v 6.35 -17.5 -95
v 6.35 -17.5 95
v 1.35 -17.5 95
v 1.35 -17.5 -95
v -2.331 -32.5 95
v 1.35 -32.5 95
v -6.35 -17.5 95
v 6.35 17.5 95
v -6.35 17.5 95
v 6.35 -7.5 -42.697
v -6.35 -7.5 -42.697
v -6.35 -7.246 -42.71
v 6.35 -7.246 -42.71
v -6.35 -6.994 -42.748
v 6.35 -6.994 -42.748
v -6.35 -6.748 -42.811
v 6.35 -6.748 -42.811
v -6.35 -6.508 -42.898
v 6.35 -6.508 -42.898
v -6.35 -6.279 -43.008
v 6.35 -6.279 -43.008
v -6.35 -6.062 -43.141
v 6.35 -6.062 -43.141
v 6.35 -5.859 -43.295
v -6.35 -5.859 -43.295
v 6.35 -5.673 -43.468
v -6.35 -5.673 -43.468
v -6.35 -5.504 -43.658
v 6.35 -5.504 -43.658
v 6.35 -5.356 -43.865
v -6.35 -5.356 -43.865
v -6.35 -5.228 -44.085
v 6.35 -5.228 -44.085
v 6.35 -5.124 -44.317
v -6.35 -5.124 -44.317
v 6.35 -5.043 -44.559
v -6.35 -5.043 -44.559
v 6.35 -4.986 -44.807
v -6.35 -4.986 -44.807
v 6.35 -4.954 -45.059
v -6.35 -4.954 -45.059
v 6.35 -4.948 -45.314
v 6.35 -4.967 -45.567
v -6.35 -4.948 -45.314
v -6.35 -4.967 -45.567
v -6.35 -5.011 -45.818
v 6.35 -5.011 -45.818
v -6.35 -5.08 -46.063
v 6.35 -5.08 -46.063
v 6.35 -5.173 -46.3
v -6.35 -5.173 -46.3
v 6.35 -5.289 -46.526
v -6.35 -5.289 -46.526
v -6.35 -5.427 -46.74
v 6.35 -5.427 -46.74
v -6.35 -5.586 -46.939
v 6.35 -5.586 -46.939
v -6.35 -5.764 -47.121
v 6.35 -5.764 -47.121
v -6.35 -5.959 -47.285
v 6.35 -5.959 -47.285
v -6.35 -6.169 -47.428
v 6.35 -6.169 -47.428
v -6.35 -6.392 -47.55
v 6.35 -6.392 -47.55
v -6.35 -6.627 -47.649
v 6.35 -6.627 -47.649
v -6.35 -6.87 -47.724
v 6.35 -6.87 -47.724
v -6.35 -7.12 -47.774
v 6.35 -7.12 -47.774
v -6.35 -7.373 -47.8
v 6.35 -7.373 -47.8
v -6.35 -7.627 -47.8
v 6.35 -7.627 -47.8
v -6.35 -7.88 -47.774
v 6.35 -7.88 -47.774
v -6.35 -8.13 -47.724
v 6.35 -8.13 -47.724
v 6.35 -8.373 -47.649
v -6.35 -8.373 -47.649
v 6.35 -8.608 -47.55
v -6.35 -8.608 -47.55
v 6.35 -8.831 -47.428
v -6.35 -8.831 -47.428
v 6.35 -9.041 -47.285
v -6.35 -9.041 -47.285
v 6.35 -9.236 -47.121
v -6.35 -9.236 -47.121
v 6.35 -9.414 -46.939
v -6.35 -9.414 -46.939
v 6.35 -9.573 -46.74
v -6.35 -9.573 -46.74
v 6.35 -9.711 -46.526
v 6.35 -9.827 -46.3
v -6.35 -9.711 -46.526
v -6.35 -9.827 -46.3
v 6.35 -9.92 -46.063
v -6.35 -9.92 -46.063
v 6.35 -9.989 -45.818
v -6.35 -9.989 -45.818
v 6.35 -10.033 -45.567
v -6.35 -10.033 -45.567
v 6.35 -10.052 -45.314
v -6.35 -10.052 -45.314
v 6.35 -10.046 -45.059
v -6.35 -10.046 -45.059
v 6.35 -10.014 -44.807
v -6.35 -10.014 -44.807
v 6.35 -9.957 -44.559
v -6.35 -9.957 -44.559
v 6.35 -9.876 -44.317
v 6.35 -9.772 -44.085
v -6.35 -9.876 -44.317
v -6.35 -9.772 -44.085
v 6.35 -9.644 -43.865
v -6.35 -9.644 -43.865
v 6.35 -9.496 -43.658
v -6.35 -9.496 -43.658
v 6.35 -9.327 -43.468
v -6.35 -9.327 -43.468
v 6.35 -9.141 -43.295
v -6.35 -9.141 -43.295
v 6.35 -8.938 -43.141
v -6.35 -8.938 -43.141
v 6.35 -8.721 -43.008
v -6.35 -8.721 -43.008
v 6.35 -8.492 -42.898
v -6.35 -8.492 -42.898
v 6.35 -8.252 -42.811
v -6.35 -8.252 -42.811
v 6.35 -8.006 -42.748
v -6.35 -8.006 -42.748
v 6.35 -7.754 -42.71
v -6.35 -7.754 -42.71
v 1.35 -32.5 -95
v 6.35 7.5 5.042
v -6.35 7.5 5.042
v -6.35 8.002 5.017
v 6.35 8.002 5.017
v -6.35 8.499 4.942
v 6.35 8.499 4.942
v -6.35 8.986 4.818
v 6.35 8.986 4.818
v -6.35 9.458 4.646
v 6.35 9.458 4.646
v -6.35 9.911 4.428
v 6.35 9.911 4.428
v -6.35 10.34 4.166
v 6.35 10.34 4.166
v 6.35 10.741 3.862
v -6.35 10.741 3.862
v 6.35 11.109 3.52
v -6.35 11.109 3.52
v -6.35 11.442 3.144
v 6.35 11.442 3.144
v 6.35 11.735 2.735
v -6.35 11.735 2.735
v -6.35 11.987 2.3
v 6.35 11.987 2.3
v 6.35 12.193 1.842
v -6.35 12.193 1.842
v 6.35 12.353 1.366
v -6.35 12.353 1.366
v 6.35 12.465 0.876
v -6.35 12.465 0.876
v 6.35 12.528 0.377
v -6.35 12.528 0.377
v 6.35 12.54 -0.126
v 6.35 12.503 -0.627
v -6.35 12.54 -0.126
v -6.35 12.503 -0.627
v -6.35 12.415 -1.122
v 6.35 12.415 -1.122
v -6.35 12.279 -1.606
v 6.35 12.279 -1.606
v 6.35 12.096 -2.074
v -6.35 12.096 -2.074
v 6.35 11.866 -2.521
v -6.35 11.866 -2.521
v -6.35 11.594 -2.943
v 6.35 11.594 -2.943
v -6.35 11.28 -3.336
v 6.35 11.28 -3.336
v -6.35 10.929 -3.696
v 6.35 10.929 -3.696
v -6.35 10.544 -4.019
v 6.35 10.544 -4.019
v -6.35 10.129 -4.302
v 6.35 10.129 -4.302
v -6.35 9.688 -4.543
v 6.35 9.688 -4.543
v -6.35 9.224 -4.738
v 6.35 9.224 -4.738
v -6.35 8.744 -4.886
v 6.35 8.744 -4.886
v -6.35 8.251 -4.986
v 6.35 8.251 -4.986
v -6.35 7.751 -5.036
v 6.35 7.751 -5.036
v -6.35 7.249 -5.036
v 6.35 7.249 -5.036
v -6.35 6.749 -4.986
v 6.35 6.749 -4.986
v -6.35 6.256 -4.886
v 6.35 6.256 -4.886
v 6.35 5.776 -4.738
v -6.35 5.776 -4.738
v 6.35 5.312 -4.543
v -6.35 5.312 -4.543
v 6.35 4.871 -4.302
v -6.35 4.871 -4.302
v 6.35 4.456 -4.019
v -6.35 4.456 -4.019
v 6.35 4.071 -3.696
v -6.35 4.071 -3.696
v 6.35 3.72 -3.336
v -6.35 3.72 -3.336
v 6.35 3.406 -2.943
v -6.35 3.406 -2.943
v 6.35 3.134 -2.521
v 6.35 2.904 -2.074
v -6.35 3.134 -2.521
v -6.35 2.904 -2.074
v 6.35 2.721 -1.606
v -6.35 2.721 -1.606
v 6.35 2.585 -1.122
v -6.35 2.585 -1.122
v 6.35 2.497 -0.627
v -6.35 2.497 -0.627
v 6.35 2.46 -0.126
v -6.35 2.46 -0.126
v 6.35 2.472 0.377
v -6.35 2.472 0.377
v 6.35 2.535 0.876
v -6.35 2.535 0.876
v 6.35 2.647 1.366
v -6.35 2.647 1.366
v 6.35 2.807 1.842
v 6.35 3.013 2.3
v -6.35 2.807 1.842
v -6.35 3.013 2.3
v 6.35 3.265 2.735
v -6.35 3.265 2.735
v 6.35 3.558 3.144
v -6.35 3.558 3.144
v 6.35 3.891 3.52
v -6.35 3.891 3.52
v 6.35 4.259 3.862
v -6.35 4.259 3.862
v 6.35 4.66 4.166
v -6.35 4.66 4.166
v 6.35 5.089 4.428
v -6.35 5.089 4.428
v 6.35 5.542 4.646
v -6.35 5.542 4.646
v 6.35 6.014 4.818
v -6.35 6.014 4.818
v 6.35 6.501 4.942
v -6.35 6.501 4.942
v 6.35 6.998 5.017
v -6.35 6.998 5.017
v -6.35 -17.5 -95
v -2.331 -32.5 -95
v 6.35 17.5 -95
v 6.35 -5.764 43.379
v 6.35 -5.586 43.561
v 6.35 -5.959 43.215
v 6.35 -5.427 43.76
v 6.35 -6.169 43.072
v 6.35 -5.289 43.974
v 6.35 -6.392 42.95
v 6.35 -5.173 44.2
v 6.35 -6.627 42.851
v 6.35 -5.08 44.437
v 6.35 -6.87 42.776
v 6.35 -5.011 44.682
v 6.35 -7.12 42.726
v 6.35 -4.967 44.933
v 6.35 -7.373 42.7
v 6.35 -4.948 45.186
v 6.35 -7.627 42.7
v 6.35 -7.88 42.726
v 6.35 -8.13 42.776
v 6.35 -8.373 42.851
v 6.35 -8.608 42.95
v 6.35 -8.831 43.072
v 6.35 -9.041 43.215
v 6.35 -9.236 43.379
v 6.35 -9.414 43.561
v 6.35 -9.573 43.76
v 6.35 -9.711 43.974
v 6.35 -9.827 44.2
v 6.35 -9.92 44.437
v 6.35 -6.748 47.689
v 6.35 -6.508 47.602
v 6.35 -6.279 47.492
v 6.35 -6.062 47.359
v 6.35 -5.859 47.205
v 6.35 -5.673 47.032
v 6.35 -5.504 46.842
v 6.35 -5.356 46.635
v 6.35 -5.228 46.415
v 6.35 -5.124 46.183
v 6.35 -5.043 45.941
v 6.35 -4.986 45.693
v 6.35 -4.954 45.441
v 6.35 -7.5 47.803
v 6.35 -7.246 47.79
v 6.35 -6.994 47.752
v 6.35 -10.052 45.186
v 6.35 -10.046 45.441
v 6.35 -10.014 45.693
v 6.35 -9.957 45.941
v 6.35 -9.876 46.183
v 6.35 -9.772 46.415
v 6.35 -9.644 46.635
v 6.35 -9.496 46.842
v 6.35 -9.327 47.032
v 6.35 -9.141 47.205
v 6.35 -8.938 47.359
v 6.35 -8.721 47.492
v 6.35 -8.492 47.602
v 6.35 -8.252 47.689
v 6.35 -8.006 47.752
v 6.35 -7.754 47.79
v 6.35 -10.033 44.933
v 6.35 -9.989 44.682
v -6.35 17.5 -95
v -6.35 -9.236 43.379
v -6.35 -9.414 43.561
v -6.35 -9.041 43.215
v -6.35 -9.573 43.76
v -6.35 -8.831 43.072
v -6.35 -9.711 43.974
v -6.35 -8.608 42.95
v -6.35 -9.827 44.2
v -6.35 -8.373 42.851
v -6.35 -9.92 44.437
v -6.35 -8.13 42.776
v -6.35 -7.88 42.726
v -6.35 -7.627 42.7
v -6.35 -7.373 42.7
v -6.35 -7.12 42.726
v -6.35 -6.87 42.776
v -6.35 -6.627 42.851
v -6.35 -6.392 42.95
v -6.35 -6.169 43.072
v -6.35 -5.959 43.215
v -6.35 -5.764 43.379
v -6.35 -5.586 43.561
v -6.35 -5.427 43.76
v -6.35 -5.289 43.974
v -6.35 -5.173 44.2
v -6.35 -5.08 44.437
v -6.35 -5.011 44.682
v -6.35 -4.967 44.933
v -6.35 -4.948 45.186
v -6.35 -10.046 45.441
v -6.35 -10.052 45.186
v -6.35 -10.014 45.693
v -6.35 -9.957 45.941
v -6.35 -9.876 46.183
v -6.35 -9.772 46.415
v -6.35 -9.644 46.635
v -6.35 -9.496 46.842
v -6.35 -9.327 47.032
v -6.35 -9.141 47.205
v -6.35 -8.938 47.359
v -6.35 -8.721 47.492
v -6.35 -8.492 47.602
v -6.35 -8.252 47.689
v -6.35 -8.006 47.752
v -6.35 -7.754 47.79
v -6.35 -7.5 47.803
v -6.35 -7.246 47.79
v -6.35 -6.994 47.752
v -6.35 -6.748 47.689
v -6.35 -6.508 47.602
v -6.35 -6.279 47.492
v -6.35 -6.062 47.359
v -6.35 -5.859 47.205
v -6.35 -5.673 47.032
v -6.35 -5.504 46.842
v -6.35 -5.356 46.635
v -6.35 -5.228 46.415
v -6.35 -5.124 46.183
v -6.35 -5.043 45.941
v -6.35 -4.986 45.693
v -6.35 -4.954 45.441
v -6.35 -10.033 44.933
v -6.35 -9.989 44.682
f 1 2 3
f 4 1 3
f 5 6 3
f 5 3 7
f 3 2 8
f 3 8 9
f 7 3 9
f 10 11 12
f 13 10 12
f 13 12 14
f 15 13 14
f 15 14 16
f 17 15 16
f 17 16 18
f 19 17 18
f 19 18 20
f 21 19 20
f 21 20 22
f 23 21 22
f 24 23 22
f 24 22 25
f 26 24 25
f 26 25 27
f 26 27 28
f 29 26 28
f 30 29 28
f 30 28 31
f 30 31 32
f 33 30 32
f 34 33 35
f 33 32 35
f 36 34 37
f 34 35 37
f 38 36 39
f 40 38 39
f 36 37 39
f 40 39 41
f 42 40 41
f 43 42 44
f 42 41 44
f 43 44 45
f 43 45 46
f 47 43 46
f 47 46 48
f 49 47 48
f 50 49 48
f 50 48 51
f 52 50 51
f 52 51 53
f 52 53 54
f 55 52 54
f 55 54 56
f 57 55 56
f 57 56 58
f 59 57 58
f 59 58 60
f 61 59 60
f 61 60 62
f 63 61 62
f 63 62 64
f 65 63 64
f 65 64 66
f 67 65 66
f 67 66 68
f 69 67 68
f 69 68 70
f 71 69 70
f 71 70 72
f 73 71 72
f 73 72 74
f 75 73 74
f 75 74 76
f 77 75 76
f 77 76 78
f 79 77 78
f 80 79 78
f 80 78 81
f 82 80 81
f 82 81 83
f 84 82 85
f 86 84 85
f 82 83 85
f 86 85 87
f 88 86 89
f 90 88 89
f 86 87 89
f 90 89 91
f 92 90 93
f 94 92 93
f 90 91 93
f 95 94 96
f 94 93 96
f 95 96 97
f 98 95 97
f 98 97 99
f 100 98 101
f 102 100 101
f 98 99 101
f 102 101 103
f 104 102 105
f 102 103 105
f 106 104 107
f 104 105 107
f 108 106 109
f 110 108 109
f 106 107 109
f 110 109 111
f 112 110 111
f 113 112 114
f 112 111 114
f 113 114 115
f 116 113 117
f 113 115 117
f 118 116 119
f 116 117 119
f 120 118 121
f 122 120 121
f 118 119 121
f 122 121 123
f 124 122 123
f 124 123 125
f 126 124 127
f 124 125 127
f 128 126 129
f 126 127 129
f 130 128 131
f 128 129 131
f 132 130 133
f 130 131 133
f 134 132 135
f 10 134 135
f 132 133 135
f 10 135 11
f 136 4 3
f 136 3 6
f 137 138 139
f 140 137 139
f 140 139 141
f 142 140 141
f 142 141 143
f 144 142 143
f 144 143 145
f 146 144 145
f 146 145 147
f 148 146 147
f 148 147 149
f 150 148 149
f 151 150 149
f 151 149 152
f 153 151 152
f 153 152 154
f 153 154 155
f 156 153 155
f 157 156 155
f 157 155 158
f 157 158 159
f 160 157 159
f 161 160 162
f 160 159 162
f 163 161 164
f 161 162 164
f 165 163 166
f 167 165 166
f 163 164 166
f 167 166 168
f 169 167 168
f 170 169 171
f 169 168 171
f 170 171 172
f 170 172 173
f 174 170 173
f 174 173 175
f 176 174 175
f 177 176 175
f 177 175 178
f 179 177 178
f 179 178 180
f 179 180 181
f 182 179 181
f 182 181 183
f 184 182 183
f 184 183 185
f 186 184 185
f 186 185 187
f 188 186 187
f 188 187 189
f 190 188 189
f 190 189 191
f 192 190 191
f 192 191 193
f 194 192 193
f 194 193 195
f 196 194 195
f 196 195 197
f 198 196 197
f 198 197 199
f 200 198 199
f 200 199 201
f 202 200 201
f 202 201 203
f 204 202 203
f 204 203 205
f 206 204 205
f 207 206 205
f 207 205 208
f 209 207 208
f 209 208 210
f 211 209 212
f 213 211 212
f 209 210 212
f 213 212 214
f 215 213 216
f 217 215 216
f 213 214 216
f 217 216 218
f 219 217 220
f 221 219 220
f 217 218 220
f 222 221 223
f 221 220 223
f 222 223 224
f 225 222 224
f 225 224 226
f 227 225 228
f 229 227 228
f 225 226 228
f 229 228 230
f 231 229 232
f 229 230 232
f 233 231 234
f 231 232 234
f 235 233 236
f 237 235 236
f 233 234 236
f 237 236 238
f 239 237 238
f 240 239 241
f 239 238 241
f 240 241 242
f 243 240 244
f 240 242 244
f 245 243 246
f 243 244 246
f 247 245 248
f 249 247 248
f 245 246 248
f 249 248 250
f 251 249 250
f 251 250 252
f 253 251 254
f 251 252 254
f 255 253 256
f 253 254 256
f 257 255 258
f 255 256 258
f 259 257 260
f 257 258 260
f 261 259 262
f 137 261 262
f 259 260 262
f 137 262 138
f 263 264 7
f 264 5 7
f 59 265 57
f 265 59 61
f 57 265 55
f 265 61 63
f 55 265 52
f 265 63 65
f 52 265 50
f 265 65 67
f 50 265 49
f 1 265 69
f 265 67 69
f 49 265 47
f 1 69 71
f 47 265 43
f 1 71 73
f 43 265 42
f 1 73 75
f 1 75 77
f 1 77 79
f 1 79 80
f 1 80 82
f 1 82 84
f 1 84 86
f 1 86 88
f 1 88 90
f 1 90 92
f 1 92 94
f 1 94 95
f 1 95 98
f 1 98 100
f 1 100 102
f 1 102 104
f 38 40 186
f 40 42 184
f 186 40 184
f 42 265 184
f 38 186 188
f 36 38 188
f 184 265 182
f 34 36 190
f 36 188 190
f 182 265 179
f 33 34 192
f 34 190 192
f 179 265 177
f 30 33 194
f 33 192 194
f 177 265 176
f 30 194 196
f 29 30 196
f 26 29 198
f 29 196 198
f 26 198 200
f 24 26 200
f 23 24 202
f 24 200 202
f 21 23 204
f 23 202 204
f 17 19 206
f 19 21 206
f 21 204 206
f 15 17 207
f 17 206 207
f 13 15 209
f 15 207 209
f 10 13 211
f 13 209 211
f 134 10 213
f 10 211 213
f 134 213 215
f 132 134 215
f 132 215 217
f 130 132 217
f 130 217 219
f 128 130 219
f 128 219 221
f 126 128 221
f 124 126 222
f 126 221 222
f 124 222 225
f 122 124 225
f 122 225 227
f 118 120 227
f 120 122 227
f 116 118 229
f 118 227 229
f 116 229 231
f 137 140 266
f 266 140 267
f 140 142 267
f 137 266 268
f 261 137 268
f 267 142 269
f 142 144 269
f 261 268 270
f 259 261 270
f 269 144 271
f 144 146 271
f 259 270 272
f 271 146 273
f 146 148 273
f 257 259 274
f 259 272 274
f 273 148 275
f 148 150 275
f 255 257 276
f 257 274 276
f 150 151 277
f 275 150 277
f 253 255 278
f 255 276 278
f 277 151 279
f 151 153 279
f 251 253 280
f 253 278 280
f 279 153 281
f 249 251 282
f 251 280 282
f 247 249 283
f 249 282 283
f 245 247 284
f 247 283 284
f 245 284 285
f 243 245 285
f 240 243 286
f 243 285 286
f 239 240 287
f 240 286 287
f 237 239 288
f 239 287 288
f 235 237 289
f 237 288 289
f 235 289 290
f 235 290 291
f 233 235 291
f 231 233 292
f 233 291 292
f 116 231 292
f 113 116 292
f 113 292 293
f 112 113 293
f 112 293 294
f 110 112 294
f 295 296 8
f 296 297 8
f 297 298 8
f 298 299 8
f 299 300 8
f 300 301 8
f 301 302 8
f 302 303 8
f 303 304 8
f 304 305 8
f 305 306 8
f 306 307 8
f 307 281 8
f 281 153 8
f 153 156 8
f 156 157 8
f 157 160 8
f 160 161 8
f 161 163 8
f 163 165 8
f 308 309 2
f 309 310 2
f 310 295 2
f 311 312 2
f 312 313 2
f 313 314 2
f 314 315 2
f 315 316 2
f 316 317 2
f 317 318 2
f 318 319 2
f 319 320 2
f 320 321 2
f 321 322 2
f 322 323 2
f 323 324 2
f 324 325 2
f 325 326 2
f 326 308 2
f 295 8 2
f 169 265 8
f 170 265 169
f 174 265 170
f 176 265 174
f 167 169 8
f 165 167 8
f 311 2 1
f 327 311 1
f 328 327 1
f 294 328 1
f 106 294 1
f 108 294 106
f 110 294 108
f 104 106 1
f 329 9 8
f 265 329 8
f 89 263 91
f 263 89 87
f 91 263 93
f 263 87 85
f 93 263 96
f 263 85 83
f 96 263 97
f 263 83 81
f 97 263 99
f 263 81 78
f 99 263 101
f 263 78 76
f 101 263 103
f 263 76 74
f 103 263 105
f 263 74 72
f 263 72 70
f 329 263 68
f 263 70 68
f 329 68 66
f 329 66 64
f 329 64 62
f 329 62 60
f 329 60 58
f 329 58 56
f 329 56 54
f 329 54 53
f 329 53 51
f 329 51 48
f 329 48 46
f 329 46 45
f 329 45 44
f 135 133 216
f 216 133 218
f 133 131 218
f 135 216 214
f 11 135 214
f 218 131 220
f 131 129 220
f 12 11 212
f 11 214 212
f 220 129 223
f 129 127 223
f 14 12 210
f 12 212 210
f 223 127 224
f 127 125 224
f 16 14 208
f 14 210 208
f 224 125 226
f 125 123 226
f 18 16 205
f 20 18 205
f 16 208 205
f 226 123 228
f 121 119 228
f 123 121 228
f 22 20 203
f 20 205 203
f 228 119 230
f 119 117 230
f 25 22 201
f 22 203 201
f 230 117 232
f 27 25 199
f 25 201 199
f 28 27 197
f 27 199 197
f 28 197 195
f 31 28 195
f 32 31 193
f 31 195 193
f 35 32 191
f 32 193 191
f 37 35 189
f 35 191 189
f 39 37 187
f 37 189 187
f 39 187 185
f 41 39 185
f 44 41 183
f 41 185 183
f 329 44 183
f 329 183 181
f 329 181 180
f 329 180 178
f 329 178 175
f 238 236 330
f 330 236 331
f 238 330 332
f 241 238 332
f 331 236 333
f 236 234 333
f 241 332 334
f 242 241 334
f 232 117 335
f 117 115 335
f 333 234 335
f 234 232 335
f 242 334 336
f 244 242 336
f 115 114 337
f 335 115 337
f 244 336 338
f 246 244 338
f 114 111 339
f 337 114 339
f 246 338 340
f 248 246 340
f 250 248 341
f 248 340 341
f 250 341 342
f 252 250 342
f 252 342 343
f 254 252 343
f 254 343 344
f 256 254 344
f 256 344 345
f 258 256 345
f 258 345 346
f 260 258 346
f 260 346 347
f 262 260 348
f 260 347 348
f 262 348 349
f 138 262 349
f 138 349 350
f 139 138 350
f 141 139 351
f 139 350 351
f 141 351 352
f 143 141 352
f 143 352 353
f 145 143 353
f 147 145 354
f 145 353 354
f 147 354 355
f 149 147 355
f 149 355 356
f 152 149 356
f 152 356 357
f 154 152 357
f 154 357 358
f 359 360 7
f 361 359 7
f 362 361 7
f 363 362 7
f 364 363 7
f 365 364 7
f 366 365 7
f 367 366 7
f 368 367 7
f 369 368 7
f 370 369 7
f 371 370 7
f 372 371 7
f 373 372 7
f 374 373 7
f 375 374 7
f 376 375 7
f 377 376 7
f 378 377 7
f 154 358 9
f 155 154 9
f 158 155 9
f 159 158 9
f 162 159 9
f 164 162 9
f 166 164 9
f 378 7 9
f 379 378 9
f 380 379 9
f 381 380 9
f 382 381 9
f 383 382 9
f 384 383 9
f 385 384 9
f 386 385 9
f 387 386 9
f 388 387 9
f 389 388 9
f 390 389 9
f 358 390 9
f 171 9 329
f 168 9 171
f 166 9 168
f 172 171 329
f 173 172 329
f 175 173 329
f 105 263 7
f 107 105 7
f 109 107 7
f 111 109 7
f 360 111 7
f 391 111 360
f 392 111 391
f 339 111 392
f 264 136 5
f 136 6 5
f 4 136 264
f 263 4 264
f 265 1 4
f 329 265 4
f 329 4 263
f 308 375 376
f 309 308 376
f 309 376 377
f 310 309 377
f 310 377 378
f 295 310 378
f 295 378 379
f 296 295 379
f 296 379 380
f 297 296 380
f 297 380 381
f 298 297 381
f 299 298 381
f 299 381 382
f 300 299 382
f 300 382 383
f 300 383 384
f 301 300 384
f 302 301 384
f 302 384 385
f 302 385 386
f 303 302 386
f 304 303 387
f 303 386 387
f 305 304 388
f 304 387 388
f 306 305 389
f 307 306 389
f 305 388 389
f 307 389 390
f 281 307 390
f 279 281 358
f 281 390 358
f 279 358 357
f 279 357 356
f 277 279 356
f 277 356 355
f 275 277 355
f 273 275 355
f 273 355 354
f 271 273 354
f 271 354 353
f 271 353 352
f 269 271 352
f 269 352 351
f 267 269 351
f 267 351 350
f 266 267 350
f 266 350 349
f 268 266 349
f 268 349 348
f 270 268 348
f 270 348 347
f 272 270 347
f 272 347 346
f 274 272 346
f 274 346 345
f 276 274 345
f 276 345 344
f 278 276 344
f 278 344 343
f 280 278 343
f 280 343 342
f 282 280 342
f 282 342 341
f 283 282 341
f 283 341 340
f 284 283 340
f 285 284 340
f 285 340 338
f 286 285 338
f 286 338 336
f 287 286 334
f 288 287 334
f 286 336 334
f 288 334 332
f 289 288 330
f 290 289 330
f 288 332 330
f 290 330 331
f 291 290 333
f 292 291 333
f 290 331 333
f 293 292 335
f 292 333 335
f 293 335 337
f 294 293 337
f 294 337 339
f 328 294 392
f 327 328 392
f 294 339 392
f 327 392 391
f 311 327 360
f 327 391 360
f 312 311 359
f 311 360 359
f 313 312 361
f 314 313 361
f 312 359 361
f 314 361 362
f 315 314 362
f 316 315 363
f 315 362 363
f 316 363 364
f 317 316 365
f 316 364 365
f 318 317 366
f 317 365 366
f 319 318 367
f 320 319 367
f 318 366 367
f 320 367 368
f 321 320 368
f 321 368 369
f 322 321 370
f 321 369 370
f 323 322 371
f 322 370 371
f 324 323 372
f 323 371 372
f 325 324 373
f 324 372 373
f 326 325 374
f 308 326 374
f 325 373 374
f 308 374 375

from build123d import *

# Parameters (mm, degrees)
SALIENTE_EXTRUIR1_DEPTH       = 95
TALADRO_ROSCADO_1_4_201_D     = 5.1054
TALADRO_DE_MARGEN_PARA_3_81_D = 10.0838


with BuildPart() as part:
    # Croquis1 → Saliente-Extruir1 (new, symmetric)
    with BuildSketch(Plane.XY):
        Polygon((6.35, -17.5), (1.35, -17.5), (1.35, -32.5), (-2.330762114, -32.5), (-6.35, -17.5), (-6.35, 17.5), (6.35, 17.5), align=None)
    extrude(amount=SALIENTE_EXTRUIR1_DEPTH, both=True)

    # Taladro roscado 1/4-201 (through all)
    with Locations(Plane(origin=(6.35, 0, 0), x_dir=(0, 0, -1), z_dir=(1, 0, 0))):
        with Locations((45.25, -7.5), (-45.25, -7.5)):
            Hole(TALADRO_ROSCADO_1_4_201_D / 2)

    # Taladro de margen para 3/81 (through all)
    with Locations(Plane(origin=(6.35, 0, 0), x_dir=(0, 0, -1), z_dir=(1, 0, 0))):
        with Locations((0, 7.5)):
            Hole(TALADRO_DE_MARGEN_PARA_3_81_D / 2)


solid = part.part
